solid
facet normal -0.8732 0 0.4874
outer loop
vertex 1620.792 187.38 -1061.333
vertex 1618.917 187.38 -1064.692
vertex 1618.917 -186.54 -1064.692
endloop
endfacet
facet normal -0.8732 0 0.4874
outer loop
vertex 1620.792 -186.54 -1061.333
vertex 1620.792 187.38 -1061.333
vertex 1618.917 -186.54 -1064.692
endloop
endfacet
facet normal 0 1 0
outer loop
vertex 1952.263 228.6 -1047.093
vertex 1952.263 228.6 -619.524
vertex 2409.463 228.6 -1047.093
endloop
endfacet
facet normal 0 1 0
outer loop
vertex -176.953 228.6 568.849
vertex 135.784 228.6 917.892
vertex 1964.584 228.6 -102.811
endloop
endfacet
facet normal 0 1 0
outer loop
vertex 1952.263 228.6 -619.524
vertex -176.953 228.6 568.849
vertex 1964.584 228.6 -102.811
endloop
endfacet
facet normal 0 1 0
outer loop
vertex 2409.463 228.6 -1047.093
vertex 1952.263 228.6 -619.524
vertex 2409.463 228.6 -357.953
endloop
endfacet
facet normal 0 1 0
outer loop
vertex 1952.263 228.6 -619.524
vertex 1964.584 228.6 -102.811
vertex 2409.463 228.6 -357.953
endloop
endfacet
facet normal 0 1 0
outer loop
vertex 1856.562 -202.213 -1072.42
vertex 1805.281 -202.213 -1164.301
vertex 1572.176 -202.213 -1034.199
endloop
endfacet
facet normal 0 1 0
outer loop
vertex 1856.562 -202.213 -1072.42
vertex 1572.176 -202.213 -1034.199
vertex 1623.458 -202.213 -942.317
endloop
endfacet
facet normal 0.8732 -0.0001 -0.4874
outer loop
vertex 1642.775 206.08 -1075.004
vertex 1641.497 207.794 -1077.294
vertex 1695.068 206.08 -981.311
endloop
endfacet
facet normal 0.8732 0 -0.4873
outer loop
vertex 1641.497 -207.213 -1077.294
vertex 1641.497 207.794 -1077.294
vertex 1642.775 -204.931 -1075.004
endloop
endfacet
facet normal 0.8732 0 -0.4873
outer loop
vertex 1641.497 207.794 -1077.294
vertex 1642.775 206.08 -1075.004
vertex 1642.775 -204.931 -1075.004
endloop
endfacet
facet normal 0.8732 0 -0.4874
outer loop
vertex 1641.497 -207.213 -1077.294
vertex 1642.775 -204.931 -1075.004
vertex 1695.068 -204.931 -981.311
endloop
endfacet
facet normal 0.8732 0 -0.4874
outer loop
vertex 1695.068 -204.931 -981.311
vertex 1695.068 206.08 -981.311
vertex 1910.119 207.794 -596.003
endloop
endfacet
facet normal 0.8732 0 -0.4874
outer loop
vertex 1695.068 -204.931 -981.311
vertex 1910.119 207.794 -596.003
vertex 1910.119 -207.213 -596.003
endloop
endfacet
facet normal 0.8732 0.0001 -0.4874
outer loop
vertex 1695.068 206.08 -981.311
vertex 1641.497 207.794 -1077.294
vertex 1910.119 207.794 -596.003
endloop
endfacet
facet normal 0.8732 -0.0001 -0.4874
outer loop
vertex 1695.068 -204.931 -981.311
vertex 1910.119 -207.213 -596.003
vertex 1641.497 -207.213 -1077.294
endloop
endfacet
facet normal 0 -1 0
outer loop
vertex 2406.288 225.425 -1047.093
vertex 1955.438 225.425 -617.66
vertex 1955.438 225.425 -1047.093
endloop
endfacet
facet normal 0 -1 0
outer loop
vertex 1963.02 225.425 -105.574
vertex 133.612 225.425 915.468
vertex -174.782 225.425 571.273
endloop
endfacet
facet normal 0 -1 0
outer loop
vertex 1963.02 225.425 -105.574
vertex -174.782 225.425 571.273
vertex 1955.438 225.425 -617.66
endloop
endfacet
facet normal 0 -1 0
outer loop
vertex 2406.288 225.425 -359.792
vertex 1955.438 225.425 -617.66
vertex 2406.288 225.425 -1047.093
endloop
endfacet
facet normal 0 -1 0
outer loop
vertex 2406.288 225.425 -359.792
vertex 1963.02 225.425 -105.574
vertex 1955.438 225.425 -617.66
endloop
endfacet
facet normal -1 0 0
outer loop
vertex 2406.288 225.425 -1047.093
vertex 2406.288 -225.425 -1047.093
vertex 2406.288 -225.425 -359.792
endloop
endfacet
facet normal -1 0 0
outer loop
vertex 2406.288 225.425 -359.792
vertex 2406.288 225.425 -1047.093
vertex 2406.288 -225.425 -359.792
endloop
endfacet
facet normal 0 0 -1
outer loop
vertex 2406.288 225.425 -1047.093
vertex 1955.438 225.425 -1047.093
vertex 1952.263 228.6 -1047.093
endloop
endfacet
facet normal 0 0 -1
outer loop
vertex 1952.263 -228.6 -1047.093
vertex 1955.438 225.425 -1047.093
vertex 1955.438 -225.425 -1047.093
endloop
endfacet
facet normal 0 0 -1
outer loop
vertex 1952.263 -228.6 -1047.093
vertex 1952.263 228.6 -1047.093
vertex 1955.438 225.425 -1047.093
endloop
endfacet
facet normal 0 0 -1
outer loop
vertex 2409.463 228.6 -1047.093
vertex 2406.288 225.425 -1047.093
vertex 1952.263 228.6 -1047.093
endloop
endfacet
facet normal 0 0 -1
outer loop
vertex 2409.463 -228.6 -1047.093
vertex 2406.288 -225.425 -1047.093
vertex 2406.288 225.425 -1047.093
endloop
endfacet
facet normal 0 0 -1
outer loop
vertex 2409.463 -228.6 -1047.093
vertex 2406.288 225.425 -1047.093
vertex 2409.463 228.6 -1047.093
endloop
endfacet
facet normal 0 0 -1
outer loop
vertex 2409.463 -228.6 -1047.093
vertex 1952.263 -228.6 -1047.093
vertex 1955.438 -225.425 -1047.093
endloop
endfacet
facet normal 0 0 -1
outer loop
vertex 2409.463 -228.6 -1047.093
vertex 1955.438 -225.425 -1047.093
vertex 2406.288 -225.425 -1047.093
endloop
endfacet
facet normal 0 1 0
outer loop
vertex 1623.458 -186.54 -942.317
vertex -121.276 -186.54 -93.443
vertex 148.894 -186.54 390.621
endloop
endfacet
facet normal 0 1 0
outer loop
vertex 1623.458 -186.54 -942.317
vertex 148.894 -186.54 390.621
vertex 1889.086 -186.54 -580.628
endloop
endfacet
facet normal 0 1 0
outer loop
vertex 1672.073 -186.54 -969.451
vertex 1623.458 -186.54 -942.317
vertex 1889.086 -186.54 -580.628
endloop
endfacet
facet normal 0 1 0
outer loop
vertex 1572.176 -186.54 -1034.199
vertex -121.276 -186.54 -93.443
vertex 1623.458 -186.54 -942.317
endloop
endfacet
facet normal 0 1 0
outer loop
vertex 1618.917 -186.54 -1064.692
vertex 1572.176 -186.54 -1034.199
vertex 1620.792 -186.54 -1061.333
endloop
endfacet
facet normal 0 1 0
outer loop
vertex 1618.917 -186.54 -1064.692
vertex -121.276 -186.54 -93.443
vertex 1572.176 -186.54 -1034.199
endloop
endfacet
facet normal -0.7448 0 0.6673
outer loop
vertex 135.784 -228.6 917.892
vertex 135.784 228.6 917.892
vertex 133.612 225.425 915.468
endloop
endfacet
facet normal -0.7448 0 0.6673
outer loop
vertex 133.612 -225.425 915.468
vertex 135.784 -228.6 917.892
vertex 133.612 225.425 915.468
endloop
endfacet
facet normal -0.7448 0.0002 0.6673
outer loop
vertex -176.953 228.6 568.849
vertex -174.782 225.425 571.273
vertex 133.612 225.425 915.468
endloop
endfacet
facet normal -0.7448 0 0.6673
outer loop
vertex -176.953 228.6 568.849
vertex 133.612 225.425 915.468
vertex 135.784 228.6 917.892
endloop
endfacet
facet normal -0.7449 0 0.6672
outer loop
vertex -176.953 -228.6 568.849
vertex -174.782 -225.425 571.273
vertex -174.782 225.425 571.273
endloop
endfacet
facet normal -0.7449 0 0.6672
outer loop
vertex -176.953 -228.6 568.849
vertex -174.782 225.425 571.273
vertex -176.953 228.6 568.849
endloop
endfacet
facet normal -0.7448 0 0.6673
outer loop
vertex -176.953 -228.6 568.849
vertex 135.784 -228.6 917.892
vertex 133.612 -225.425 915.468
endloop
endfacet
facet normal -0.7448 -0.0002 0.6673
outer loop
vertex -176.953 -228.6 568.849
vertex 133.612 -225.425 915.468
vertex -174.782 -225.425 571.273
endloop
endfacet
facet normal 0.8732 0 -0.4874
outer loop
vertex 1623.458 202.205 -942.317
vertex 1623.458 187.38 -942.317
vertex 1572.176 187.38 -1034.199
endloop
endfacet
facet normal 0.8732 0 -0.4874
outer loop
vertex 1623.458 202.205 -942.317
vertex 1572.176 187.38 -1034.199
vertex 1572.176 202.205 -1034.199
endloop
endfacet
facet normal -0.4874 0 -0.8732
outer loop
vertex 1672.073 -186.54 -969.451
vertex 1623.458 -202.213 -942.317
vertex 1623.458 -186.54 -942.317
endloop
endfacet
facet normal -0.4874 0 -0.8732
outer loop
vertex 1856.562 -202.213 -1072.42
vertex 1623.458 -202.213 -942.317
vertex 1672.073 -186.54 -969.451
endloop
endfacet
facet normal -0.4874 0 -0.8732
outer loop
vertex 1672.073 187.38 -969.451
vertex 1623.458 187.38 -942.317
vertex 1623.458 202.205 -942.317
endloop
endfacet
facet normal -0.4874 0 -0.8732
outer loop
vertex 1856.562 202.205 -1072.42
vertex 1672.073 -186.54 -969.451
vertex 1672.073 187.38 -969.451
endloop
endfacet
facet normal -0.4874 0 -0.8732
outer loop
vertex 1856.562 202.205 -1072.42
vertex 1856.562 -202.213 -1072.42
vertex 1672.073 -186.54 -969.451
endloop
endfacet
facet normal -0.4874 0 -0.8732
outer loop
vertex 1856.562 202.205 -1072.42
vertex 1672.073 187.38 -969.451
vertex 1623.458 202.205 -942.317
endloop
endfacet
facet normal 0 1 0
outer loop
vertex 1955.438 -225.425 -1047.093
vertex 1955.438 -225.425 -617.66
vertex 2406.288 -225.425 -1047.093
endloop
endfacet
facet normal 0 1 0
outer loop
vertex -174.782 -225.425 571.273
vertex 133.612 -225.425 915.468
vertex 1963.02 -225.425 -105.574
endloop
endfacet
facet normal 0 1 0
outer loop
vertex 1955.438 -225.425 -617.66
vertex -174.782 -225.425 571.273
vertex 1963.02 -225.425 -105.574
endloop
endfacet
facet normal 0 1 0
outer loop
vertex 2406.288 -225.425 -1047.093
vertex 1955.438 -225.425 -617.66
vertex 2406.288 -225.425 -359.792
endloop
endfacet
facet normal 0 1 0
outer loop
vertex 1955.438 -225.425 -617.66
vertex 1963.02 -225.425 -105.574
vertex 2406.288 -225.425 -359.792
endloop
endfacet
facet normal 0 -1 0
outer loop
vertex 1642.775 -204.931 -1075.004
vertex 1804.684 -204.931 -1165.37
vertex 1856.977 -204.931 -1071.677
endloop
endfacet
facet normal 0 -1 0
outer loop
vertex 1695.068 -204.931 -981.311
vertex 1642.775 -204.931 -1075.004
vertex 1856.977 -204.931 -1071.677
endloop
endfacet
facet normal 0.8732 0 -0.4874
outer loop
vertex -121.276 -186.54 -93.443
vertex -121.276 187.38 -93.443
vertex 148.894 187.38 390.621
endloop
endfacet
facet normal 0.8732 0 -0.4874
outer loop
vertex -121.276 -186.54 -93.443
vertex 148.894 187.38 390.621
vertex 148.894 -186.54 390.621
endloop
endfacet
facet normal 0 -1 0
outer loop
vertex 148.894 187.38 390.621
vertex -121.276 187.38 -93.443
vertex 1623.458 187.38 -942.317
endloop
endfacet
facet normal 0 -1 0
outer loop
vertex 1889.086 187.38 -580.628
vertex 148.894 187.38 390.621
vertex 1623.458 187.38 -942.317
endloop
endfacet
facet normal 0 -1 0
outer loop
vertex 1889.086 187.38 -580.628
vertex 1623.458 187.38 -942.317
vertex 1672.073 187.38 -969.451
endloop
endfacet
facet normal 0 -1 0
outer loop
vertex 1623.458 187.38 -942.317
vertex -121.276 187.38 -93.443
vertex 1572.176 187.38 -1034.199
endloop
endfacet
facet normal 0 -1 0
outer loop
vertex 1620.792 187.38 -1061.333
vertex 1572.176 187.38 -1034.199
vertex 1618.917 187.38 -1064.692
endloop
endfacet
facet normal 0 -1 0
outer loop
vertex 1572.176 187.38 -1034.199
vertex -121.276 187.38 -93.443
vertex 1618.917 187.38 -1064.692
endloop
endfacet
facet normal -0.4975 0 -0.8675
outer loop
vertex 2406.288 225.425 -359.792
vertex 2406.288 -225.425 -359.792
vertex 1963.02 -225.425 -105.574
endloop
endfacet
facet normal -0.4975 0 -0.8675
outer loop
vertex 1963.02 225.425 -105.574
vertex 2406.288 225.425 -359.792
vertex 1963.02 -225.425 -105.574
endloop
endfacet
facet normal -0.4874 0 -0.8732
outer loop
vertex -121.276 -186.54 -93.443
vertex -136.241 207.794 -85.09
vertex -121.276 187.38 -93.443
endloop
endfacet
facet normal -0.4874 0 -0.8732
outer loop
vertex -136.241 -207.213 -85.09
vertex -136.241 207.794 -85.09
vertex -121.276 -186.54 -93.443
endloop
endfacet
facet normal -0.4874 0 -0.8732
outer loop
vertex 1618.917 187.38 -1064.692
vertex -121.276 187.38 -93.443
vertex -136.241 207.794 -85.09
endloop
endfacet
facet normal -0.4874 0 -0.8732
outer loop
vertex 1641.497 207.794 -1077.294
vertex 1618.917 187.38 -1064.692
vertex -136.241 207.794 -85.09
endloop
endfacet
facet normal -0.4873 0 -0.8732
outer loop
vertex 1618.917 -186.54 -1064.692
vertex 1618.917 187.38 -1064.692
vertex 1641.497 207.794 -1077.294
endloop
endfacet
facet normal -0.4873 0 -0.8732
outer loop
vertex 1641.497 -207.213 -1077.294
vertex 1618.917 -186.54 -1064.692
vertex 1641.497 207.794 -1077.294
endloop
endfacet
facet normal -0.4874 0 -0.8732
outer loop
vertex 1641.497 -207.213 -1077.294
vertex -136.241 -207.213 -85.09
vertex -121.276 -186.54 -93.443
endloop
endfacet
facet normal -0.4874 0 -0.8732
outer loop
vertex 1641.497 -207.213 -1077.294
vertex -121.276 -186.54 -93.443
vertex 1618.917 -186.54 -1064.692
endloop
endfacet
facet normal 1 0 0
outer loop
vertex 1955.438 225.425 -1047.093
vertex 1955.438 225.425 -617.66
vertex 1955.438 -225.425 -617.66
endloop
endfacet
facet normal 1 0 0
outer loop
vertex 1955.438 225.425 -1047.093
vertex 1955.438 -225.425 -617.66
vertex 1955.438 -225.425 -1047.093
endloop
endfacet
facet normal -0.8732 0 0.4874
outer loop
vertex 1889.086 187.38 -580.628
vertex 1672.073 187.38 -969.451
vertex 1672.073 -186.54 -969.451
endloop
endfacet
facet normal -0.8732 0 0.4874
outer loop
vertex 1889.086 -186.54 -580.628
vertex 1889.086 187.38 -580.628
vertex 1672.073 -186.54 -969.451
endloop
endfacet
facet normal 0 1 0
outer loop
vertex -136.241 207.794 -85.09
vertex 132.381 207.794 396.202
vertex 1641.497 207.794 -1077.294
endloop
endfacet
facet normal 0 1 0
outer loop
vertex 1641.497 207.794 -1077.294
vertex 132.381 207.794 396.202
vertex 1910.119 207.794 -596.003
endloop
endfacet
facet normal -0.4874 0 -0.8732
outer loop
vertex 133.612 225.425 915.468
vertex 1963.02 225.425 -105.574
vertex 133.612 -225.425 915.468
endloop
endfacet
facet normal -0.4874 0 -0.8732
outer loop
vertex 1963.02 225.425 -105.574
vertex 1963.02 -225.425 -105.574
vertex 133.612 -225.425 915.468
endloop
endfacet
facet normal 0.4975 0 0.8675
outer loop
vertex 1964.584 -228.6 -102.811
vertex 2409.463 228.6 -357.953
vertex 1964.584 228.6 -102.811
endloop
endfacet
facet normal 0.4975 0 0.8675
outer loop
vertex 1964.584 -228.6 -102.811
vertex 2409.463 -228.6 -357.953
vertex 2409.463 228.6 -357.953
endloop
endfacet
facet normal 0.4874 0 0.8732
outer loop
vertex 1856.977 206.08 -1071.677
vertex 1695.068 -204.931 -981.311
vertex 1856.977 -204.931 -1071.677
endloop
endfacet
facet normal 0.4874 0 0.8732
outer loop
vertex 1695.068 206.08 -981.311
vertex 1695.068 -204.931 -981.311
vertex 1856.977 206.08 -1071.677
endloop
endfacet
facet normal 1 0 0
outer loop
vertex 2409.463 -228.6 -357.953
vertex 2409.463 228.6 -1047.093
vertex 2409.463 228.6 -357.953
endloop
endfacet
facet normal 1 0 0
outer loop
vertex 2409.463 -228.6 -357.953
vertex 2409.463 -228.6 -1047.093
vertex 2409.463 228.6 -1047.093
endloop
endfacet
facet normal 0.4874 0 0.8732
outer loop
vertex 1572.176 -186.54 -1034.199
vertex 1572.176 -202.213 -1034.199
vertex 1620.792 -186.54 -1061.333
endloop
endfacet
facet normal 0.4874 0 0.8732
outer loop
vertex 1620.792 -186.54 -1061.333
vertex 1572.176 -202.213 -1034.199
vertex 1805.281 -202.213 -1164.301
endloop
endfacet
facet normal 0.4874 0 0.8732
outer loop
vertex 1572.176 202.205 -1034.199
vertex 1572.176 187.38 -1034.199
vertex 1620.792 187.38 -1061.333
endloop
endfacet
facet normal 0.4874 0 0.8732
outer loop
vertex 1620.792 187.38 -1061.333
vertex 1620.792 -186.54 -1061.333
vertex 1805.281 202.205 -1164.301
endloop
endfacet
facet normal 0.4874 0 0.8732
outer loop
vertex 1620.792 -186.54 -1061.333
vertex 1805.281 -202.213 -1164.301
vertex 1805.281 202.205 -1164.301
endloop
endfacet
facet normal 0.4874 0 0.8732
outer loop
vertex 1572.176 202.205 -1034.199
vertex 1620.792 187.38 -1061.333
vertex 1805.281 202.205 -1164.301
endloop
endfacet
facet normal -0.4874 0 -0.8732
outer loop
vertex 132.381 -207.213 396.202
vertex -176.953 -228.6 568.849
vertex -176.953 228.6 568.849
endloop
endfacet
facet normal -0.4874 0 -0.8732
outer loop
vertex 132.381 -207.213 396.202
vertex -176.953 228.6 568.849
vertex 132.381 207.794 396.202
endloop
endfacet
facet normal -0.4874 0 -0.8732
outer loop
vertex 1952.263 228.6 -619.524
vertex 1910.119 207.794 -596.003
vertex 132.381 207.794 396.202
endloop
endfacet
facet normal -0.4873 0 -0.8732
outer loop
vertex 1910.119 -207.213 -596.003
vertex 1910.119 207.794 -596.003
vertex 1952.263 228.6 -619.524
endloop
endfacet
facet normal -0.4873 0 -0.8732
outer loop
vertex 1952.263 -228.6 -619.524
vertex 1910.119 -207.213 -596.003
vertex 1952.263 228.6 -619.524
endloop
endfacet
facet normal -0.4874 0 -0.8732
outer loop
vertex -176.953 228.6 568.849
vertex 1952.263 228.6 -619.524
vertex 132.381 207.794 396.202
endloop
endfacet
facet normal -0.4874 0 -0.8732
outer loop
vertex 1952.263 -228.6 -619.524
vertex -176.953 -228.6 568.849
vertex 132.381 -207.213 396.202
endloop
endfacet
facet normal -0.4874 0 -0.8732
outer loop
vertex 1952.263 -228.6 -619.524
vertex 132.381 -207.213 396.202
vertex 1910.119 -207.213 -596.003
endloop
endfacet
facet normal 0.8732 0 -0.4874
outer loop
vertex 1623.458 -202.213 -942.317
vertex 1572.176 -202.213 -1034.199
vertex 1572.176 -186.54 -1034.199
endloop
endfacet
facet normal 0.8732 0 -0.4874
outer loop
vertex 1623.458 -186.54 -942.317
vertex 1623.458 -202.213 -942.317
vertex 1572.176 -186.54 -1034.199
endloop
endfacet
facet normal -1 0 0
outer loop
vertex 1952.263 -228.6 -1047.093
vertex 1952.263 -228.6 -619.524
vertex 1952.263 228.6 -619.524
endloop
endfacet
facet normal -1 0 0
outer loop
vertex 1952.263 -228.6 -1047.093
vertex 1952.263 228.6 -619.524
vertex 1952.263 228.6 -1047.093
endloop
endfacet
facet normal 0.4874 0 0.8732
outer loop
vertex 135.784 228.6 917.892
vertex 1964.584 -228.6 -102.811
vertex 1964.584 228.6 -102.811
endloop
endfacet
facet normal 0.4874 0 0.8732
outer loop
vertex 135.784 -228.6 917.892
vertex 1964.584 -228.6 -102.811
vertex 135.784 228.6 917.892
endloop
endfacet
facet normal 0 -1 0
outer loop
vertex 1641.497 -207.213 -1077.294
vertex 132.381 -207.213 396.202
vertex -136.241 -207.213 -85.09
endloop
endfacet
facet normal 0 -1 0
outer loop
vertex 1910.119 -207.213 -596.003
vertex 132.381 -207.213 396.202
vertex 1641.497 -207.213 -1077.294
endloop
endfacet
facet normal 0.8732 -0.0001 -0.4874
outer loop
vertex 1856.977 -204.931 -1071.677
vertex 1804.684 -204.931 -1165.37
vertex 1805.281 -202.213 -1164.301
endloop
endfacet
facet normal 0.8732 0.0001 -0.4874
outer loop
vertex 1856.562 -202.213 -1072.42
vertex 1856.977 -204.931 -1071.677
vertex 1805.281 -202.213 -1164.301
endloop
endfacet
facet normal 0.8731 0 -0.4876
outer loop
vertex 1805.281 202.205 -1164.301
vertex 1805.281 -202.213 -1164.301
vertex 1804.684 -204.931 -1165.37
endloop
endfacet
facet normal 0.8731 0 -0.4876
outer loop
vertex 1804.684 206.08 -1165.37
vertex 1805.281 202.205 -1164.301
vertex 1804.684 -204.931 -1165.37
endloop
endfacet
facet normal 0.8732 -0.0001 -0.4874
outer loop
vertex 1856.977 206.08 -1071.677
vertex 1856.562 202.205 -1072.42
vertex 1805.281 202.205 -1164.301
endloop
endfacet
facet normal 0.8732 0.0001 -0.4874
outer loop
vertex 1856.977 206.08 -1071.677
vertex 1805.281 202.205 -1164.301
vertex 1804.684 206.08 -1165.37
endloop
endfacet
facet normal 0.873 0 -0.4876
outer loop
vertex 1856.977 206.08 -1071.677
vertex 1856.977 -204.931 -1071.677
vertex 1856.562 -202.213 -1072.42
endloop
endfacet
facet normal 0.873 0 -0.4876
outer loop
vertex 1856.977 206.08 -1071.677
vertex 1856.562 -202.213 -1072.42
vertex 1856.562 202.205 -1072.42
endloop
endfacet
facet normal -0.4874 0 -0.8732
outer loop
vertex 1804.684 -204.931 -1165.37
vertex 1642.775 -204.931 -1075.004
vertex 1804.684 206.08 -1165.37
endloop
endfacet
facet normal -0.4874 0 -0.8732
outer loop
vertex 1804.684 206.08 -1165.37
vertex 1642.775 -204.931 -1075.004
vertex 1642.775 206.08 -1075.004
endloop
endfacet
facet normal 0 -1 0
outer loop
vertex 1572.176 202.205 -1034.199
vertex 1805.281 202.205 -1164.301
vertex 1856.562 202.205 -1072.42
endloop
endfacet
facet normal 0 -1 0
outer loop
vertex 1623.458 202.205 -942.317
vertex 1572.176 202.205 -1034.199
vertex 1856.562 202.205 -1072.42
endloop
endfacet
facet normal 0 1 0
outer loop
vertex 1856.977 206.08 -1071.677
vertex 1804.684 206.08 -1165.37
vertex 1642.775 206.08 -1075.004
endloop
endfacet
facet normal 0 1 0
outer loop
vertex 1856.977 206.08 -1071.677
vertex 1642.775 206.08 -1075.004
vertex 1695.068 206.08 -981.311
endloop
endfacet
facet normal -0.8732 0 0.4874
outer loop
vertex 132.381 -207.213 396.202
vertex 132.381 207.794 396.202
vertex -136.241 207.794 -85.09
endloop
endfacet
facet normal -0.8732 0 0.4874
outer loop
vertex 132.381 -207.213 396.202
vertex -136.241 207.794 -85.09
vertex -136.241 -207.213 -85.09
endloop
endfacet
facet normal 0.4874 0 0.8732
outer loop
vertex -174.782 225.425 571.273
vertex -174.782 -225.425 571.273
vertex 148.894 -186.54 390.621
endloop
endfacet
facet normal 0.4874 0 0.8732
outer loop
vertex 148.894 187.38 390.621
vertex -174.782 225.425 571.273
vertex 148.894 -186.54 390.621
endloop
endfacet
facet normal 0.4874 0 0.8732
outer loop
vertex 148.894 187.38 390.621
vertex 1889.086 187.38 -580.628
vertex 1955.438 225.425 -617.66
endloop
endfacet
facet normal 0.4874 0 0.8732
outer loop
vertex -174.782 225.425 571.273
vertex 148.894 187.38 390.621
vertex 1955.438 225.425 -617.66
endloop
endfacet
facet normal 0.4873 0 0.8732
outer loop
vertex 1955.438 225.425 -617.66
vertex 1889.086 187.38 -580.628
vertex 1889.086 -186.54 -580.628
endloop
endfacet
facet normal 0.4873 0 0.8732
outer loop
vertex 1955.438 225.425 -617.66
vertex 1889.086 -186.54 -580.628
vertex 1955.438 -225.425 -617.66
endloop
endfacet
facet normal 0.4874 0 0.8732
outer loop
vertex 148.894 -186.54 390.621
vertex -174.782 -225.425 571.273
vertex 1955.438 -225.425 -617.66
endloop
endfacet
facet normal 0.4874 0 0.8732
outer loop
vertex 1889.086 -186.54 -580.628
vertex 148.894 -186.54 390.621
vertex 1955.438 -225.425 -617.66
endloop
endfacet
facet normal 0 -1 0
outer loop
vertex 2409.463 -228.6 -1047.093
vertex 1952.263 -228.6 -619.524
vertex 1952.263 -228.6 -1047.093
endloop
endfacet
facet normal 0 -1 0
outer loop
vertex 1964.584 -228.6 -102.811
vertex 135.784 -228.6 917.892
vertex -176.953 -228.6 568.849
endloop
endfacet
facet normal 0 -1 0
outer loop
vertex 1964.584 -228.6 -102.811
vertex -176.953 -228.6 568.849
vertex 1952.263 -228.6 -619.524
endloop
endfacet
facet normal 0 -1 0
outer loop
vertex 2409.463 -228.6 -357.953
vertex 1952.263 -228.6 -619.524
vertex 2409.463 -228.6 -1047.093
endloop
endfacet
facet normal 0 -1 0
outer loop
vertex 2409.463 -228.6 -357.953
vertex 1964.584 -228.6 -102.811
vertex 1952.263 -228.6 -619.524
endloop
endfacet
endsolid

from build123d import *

# Parameters (mm, degrees)
F1_DEPTH  = 228.6
F2_T      = -3.175
F3_W      = 2035.8837321401
F3_H      = 415.0076210499
F4_DEPTH  = 551.18
F5_W      = 1992.8858019412
F5_H      = 373.9200532436
F6_DEPTH  = 759.46
F7_W      = 411.0114574432
F7_H      = 107.2978954762
F8_DEPTH  = 185.42
F9_W      = 404.4185429811
F9_H      = 105.2236258984
F10_DEPTH = 266.954


with BuildPart() as f1:
    # F0 (on Front) → F1 (new body, symmetric)
    with BuildSketch(Plane.XZ):
        Polygon((1964.5838737488, -102.81098634), (135.7838737488, 917.8921075174), (-176.9533361432, 568.8492368309), (1952.2630823642, -619.5244431026), (1952.2630823642, -1047.0928401104), (2409.4630823642, -1047.0928401104), (2409.4630823642, -357.9530729597), align=None)
    extrude(amount=F1_DEPTH, both=True)

    # F2
    f2_openings = [f1.faces().sort_by_distance(p)[0] for p in [
        (2180.863082, 0, -1047.09284),
        (-20.584731, 0, 743.370672),
    ]]
    offset(amount=F2_T, openings=f2_openings, kind=Kind.INTERSECTION)

    # F3 (on face) → F4 (join)
    with BuildSketch(Plane(origin=(200.0511033435, 0, 358.4327900997), x_dir=(0.8732022714, 0, -0.4873579724), z_dir=(-0.4873579724, 0, -0.8732022714))):
        with Locations((940.4449127614, -0.2903789282)):
            Rectangle(F3_W, F3_H)
    extrude(amount=F4_DEPTH)

    # F5 (on face) → F6 (cut)
    with BuildSketch(Plane(origin=(-68.5708638914, 0, -122.8588378338), x_dir=(0.8732022714, 0, -0.4873579724), z_dir=(-0.4873579724, 0, -0.8732022714))):
        with Locations((936.0848795623, -0.4200935364)):
            Rectangle(F5_W, F5_H)
    extrude(amount=-F6_DEPTH, mode=Mode.SUBTRACT)

    # F7 (on face) → F8 (join)
    with BuildSketch(Plane(origin=(1710.0677834956, 0, -954.4354097331), x_dir=(0, 1, 0), z_dir=(0.8732022714, 0, -0.4873579724))):
        with Locations((0.5745142698, -84.4273874536)):
            Rectangle(F7_W, F7_H)
    extrude(amount=F8_DEPTH)

    # F9 (on face) → F10 (cut)
    with BuildSketch(Plane(origin=(1871.9769486529, 0, -1044.801324978), x_dir=(0, 1, 0), z_dir=(0.8732022714, 0, -0.4873579724))):
        with Locations((-0.0041797757, -84.2405110598)):
            Rectangle(F9_W, F9_H)
    extrude(amount=-F10_DEPTH, mode=Mode.SUBTRACT)


solid = f1.part
